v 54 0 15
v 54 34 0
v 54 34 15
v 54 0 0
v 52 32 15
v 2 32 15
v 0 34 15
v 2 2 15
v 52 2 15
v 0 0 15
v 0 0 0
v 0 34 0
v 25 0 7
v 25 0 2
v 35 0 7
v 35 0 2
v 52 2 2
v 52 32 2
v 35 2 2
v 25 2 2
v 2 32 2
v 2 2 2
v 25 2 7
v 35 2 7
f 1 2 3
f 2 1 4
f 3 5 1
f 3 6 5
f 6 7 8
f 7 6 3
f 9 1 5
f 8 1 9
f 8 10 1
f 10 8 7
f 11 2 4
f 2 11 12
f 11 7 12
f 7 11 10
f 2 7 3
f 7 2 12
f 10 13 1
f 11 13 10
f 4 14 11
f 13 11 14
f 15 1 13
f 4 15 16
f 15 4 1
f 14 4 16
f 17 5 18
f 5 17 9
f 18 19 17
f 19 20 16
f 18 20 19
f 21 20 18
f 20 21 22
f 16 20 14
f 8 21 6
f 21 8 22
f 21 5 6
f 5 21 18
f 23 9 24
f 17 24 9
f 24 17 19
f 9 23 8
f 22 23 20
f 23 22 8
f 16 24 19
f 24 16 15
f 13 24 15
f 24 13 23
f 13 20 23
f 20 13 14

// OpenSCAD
difference() {
    cube([54,34,15]);
    translate([2,2,2])
        cube([50,30,16]);
    translate([25,-1,2])
        cube([10,3,5]);
}
